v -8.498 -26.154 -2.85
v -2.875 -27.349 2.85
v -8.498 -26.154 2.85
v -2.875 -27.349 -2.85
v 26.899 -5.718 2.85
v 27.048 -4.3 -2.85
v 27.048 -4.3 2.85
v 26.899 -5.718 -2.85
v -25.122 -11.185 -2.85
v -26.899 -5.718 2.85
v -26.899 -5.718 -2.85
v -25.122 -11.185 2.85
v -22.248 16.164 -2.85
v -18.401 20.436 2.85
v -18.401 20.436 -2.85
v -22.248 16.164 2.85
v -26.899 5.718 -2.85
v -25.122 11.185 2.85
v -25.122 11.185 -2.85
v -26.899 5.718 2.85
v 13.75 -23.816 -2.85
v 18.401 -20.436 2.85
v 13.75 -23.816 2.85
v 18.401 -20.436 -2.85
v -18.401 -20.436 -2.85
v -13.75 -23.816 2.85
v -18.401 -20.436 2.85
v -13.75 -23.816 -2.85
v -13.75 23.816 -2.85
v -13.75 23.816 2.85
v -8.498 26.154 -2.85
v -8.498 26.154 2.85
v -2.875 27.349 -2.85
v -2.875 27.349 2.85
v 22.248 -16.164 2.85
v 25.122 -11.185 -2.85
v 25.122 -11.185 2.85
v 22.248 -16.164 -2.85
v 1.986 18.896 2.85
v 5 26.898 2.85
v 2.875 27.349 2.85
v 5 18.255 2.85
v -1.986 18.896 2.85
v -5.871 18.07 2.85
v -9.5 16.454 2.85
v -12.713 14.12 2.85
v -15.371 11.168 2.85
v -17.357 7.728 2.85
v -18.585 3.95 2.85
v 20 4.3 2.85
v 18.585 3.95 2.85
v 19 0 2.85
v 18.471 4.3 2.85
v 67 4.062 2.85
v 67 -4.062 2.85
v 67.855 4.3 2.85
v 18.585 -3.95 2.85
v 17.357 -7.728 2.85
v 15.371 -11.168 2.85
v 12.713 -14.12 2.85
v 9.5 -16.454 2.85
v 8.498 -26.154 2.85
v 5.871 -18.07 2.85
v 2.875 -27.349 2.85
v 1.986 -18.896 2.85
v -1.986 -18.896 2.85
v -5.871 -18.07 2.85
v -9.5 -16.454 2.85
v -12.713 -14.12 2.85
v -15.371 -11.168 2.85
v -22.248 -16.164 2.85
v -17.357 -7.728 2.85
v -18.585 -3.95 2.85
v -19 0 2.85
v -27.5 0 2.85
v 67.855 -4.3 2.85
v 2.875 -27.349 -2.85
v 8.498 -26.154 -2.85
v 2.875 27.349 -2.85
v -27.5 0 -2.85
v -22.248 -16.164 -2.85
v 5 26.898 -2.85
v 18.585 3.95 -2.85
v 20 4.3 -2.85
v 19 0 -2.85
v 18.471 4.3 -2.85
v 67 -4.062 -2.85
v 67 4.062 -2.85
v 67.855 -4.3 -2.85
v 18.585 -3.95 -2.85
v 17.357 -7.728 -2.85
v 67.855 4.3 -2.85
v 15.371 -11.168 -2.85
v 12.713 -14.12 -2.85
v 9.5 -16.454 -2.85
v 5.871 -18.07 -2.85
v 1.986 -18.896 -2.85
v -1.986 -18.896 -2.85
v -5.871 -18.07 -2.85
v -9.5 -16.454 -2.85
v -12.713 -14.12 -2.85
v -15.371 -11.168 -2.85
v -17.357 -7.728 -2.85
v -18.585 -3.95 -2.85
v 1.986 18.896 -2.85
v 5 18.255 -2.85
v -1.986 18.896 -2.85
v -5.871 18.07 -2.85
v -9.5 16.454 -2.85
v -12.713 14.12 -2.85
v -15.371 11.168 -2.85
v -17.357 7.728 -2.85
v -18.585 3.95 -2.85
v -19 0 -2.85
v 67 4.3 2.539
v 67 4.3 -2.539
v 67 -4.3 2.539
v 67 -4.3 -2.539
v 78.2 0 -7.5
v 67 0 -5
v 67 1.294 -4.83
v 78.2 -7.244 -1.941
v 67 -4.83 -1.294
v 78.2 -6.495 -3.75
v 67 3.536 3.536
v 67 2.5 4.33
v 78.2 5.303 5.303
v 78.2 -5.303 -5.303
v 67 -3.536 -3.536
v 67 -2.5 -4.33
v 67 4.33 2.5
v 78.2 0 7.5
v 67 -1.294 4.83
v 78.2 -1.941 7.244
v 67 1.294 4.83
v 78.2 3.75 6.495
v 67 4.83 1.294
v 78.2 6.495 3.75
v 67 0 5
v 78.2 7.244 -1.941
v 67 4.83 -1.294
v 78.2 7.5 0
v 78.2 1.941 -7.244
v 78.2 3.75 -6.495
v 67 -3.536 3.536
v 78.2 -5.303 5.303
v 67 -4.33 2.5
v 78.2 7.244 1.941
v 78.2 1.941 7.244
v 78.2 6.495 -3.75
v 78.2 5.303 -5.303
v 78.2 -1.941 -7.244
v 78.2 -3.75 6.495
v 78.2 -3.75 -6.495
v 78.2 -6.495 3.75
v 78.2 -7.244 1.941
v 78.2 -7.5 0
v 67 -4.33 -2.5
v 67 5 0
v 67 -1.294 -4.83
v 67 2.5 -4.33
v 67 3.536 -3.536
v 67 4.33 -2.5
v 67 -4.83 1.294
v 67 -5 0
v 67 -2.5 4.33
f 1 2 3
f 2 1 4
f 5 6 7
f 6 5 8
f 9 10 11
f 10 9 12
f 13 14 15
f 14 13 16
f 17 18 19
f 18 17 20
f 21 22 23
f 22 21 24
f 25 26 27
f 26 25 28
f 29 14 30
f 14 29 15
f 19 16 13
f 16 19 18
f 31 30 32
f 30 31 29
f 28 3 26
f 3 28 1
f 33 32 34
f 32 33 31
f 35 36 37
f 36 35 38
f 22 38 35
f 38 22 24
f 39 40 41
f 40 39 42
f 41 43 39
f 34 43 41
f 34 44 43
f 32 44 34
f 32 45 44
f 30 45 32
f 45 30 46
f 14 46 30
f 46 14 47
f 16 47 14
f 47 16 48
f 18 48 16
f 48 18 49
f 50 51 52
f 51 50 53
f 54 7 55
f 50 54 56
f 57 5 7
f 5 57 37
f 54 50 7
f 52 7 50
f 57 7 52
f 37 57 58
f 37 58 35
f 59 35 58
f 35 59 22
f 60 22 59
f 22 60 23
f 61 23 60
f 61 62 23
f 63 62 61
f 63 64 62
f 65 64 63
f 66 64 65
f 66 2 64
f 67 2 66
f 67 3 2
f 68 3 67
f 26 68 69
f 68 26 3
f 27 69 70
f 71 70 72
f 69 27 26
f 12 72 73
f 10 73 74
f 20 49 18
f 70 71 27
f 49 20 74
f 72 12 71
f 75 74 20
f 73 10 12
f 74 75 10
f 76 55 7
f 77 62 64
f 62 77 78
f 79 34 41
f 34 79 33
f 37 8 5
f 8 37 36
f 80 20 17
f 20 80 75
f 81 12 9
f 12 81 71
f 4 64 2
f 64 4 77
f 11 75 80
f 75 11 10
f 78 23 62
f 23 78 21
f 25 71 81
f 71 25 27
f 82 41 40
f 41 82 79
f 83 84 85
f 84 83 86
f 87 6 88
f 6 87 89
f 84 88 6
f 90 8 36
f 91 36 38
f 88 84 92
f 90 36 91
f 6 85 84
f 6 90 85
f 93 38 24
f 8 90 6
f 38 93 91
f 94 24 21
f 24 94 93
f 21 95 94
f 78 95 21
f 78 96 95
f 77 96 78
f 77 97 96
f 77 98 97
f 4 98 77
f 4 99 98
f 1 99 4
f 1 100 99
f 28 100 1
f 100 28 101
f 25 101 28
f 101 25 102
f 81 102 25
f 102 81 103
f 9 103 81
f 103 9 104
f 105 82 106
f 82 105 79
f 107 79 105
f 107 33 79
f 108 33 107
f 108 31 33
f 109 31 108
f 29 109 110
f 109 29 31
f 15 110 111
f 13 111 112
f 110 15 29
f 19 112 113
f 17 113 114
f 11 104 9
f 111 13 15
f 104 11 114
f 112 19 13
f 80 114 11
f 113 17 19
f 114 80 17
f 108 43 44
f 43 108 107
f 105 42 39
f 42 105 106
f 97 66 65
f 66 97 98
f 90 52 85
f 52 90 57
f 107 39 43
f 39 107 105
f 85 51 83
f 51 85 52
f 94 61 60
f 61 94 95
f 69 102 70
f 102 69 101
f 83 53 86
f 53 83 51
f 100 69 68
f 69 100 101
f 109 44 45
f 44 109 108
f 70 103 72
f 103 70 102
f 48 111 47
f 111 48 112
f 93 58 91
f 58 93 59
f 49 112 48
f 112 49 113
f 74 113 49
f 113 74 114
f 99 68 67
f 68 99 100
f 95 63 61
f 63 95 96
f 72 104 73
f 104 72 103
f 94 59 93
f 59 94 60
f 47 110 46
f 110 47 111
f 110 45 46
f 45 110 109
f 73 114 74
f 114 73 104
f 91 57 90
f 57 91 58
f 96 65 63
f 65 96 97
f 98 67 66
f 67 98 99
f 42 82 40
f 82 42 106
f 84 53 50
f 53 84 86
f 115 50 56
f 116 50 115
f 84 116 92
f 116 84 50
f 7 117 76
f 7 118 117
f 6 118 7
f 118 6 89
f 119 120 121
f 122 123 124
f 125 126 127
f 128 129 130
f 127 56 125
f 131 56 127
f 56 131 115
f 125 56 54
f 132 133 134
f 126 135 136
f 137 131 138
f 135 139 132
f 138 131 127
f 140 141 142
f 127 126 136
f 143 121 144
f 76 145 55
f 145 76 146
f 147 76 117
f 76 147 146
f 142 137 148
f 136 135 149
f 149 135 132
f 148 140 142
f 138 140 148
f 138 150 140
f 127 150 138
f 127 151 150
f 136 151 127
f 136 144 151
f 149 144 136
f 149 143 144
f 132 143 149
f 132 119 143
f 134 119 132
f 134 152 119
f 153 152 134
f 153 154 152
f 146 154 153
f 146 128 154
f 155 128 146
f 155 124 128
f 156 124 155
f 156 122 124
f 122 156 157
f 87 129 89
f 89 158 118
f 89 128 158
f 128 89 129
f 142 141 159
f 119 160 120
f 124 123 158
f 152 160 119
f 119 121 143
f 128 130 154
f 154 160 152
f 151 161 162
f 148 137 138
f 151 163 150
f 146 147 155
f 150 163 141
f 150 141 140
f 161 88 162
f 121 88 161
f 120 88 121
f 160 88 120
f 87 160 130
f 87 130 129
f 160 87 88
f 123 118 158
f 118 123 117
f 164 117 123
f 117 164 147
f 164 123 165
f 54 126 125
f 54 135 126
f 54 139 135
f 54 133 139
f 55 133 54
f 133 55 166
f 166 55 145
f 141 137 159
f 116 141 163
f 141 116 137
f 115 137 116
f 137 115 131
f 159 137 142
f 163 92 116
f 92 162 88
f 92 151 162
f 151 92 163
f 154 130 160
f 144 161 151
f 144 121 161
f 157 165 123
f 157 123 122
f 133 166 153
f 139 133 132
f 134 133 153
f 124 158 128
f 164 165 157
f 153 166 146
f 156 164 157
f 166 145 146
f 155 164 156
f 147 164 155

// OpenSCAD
difference(){
cylinder(r=55/2,h=5.7,center=true);

cylinder(r=38/2,h=8,center=true);
translate([50,10,0])cylinder(r=12/2,h=8,center=true);
translate([5,8.6/2,-25])cube(50);    

}

rotate([0,0,0])translate([45,0,0]){
cube([50,8.6,5.7],center=true);
translate([22,0,0])rotate([0,90,0])cylinder(r1=10/2,r2=15/2,h=11.2);}
